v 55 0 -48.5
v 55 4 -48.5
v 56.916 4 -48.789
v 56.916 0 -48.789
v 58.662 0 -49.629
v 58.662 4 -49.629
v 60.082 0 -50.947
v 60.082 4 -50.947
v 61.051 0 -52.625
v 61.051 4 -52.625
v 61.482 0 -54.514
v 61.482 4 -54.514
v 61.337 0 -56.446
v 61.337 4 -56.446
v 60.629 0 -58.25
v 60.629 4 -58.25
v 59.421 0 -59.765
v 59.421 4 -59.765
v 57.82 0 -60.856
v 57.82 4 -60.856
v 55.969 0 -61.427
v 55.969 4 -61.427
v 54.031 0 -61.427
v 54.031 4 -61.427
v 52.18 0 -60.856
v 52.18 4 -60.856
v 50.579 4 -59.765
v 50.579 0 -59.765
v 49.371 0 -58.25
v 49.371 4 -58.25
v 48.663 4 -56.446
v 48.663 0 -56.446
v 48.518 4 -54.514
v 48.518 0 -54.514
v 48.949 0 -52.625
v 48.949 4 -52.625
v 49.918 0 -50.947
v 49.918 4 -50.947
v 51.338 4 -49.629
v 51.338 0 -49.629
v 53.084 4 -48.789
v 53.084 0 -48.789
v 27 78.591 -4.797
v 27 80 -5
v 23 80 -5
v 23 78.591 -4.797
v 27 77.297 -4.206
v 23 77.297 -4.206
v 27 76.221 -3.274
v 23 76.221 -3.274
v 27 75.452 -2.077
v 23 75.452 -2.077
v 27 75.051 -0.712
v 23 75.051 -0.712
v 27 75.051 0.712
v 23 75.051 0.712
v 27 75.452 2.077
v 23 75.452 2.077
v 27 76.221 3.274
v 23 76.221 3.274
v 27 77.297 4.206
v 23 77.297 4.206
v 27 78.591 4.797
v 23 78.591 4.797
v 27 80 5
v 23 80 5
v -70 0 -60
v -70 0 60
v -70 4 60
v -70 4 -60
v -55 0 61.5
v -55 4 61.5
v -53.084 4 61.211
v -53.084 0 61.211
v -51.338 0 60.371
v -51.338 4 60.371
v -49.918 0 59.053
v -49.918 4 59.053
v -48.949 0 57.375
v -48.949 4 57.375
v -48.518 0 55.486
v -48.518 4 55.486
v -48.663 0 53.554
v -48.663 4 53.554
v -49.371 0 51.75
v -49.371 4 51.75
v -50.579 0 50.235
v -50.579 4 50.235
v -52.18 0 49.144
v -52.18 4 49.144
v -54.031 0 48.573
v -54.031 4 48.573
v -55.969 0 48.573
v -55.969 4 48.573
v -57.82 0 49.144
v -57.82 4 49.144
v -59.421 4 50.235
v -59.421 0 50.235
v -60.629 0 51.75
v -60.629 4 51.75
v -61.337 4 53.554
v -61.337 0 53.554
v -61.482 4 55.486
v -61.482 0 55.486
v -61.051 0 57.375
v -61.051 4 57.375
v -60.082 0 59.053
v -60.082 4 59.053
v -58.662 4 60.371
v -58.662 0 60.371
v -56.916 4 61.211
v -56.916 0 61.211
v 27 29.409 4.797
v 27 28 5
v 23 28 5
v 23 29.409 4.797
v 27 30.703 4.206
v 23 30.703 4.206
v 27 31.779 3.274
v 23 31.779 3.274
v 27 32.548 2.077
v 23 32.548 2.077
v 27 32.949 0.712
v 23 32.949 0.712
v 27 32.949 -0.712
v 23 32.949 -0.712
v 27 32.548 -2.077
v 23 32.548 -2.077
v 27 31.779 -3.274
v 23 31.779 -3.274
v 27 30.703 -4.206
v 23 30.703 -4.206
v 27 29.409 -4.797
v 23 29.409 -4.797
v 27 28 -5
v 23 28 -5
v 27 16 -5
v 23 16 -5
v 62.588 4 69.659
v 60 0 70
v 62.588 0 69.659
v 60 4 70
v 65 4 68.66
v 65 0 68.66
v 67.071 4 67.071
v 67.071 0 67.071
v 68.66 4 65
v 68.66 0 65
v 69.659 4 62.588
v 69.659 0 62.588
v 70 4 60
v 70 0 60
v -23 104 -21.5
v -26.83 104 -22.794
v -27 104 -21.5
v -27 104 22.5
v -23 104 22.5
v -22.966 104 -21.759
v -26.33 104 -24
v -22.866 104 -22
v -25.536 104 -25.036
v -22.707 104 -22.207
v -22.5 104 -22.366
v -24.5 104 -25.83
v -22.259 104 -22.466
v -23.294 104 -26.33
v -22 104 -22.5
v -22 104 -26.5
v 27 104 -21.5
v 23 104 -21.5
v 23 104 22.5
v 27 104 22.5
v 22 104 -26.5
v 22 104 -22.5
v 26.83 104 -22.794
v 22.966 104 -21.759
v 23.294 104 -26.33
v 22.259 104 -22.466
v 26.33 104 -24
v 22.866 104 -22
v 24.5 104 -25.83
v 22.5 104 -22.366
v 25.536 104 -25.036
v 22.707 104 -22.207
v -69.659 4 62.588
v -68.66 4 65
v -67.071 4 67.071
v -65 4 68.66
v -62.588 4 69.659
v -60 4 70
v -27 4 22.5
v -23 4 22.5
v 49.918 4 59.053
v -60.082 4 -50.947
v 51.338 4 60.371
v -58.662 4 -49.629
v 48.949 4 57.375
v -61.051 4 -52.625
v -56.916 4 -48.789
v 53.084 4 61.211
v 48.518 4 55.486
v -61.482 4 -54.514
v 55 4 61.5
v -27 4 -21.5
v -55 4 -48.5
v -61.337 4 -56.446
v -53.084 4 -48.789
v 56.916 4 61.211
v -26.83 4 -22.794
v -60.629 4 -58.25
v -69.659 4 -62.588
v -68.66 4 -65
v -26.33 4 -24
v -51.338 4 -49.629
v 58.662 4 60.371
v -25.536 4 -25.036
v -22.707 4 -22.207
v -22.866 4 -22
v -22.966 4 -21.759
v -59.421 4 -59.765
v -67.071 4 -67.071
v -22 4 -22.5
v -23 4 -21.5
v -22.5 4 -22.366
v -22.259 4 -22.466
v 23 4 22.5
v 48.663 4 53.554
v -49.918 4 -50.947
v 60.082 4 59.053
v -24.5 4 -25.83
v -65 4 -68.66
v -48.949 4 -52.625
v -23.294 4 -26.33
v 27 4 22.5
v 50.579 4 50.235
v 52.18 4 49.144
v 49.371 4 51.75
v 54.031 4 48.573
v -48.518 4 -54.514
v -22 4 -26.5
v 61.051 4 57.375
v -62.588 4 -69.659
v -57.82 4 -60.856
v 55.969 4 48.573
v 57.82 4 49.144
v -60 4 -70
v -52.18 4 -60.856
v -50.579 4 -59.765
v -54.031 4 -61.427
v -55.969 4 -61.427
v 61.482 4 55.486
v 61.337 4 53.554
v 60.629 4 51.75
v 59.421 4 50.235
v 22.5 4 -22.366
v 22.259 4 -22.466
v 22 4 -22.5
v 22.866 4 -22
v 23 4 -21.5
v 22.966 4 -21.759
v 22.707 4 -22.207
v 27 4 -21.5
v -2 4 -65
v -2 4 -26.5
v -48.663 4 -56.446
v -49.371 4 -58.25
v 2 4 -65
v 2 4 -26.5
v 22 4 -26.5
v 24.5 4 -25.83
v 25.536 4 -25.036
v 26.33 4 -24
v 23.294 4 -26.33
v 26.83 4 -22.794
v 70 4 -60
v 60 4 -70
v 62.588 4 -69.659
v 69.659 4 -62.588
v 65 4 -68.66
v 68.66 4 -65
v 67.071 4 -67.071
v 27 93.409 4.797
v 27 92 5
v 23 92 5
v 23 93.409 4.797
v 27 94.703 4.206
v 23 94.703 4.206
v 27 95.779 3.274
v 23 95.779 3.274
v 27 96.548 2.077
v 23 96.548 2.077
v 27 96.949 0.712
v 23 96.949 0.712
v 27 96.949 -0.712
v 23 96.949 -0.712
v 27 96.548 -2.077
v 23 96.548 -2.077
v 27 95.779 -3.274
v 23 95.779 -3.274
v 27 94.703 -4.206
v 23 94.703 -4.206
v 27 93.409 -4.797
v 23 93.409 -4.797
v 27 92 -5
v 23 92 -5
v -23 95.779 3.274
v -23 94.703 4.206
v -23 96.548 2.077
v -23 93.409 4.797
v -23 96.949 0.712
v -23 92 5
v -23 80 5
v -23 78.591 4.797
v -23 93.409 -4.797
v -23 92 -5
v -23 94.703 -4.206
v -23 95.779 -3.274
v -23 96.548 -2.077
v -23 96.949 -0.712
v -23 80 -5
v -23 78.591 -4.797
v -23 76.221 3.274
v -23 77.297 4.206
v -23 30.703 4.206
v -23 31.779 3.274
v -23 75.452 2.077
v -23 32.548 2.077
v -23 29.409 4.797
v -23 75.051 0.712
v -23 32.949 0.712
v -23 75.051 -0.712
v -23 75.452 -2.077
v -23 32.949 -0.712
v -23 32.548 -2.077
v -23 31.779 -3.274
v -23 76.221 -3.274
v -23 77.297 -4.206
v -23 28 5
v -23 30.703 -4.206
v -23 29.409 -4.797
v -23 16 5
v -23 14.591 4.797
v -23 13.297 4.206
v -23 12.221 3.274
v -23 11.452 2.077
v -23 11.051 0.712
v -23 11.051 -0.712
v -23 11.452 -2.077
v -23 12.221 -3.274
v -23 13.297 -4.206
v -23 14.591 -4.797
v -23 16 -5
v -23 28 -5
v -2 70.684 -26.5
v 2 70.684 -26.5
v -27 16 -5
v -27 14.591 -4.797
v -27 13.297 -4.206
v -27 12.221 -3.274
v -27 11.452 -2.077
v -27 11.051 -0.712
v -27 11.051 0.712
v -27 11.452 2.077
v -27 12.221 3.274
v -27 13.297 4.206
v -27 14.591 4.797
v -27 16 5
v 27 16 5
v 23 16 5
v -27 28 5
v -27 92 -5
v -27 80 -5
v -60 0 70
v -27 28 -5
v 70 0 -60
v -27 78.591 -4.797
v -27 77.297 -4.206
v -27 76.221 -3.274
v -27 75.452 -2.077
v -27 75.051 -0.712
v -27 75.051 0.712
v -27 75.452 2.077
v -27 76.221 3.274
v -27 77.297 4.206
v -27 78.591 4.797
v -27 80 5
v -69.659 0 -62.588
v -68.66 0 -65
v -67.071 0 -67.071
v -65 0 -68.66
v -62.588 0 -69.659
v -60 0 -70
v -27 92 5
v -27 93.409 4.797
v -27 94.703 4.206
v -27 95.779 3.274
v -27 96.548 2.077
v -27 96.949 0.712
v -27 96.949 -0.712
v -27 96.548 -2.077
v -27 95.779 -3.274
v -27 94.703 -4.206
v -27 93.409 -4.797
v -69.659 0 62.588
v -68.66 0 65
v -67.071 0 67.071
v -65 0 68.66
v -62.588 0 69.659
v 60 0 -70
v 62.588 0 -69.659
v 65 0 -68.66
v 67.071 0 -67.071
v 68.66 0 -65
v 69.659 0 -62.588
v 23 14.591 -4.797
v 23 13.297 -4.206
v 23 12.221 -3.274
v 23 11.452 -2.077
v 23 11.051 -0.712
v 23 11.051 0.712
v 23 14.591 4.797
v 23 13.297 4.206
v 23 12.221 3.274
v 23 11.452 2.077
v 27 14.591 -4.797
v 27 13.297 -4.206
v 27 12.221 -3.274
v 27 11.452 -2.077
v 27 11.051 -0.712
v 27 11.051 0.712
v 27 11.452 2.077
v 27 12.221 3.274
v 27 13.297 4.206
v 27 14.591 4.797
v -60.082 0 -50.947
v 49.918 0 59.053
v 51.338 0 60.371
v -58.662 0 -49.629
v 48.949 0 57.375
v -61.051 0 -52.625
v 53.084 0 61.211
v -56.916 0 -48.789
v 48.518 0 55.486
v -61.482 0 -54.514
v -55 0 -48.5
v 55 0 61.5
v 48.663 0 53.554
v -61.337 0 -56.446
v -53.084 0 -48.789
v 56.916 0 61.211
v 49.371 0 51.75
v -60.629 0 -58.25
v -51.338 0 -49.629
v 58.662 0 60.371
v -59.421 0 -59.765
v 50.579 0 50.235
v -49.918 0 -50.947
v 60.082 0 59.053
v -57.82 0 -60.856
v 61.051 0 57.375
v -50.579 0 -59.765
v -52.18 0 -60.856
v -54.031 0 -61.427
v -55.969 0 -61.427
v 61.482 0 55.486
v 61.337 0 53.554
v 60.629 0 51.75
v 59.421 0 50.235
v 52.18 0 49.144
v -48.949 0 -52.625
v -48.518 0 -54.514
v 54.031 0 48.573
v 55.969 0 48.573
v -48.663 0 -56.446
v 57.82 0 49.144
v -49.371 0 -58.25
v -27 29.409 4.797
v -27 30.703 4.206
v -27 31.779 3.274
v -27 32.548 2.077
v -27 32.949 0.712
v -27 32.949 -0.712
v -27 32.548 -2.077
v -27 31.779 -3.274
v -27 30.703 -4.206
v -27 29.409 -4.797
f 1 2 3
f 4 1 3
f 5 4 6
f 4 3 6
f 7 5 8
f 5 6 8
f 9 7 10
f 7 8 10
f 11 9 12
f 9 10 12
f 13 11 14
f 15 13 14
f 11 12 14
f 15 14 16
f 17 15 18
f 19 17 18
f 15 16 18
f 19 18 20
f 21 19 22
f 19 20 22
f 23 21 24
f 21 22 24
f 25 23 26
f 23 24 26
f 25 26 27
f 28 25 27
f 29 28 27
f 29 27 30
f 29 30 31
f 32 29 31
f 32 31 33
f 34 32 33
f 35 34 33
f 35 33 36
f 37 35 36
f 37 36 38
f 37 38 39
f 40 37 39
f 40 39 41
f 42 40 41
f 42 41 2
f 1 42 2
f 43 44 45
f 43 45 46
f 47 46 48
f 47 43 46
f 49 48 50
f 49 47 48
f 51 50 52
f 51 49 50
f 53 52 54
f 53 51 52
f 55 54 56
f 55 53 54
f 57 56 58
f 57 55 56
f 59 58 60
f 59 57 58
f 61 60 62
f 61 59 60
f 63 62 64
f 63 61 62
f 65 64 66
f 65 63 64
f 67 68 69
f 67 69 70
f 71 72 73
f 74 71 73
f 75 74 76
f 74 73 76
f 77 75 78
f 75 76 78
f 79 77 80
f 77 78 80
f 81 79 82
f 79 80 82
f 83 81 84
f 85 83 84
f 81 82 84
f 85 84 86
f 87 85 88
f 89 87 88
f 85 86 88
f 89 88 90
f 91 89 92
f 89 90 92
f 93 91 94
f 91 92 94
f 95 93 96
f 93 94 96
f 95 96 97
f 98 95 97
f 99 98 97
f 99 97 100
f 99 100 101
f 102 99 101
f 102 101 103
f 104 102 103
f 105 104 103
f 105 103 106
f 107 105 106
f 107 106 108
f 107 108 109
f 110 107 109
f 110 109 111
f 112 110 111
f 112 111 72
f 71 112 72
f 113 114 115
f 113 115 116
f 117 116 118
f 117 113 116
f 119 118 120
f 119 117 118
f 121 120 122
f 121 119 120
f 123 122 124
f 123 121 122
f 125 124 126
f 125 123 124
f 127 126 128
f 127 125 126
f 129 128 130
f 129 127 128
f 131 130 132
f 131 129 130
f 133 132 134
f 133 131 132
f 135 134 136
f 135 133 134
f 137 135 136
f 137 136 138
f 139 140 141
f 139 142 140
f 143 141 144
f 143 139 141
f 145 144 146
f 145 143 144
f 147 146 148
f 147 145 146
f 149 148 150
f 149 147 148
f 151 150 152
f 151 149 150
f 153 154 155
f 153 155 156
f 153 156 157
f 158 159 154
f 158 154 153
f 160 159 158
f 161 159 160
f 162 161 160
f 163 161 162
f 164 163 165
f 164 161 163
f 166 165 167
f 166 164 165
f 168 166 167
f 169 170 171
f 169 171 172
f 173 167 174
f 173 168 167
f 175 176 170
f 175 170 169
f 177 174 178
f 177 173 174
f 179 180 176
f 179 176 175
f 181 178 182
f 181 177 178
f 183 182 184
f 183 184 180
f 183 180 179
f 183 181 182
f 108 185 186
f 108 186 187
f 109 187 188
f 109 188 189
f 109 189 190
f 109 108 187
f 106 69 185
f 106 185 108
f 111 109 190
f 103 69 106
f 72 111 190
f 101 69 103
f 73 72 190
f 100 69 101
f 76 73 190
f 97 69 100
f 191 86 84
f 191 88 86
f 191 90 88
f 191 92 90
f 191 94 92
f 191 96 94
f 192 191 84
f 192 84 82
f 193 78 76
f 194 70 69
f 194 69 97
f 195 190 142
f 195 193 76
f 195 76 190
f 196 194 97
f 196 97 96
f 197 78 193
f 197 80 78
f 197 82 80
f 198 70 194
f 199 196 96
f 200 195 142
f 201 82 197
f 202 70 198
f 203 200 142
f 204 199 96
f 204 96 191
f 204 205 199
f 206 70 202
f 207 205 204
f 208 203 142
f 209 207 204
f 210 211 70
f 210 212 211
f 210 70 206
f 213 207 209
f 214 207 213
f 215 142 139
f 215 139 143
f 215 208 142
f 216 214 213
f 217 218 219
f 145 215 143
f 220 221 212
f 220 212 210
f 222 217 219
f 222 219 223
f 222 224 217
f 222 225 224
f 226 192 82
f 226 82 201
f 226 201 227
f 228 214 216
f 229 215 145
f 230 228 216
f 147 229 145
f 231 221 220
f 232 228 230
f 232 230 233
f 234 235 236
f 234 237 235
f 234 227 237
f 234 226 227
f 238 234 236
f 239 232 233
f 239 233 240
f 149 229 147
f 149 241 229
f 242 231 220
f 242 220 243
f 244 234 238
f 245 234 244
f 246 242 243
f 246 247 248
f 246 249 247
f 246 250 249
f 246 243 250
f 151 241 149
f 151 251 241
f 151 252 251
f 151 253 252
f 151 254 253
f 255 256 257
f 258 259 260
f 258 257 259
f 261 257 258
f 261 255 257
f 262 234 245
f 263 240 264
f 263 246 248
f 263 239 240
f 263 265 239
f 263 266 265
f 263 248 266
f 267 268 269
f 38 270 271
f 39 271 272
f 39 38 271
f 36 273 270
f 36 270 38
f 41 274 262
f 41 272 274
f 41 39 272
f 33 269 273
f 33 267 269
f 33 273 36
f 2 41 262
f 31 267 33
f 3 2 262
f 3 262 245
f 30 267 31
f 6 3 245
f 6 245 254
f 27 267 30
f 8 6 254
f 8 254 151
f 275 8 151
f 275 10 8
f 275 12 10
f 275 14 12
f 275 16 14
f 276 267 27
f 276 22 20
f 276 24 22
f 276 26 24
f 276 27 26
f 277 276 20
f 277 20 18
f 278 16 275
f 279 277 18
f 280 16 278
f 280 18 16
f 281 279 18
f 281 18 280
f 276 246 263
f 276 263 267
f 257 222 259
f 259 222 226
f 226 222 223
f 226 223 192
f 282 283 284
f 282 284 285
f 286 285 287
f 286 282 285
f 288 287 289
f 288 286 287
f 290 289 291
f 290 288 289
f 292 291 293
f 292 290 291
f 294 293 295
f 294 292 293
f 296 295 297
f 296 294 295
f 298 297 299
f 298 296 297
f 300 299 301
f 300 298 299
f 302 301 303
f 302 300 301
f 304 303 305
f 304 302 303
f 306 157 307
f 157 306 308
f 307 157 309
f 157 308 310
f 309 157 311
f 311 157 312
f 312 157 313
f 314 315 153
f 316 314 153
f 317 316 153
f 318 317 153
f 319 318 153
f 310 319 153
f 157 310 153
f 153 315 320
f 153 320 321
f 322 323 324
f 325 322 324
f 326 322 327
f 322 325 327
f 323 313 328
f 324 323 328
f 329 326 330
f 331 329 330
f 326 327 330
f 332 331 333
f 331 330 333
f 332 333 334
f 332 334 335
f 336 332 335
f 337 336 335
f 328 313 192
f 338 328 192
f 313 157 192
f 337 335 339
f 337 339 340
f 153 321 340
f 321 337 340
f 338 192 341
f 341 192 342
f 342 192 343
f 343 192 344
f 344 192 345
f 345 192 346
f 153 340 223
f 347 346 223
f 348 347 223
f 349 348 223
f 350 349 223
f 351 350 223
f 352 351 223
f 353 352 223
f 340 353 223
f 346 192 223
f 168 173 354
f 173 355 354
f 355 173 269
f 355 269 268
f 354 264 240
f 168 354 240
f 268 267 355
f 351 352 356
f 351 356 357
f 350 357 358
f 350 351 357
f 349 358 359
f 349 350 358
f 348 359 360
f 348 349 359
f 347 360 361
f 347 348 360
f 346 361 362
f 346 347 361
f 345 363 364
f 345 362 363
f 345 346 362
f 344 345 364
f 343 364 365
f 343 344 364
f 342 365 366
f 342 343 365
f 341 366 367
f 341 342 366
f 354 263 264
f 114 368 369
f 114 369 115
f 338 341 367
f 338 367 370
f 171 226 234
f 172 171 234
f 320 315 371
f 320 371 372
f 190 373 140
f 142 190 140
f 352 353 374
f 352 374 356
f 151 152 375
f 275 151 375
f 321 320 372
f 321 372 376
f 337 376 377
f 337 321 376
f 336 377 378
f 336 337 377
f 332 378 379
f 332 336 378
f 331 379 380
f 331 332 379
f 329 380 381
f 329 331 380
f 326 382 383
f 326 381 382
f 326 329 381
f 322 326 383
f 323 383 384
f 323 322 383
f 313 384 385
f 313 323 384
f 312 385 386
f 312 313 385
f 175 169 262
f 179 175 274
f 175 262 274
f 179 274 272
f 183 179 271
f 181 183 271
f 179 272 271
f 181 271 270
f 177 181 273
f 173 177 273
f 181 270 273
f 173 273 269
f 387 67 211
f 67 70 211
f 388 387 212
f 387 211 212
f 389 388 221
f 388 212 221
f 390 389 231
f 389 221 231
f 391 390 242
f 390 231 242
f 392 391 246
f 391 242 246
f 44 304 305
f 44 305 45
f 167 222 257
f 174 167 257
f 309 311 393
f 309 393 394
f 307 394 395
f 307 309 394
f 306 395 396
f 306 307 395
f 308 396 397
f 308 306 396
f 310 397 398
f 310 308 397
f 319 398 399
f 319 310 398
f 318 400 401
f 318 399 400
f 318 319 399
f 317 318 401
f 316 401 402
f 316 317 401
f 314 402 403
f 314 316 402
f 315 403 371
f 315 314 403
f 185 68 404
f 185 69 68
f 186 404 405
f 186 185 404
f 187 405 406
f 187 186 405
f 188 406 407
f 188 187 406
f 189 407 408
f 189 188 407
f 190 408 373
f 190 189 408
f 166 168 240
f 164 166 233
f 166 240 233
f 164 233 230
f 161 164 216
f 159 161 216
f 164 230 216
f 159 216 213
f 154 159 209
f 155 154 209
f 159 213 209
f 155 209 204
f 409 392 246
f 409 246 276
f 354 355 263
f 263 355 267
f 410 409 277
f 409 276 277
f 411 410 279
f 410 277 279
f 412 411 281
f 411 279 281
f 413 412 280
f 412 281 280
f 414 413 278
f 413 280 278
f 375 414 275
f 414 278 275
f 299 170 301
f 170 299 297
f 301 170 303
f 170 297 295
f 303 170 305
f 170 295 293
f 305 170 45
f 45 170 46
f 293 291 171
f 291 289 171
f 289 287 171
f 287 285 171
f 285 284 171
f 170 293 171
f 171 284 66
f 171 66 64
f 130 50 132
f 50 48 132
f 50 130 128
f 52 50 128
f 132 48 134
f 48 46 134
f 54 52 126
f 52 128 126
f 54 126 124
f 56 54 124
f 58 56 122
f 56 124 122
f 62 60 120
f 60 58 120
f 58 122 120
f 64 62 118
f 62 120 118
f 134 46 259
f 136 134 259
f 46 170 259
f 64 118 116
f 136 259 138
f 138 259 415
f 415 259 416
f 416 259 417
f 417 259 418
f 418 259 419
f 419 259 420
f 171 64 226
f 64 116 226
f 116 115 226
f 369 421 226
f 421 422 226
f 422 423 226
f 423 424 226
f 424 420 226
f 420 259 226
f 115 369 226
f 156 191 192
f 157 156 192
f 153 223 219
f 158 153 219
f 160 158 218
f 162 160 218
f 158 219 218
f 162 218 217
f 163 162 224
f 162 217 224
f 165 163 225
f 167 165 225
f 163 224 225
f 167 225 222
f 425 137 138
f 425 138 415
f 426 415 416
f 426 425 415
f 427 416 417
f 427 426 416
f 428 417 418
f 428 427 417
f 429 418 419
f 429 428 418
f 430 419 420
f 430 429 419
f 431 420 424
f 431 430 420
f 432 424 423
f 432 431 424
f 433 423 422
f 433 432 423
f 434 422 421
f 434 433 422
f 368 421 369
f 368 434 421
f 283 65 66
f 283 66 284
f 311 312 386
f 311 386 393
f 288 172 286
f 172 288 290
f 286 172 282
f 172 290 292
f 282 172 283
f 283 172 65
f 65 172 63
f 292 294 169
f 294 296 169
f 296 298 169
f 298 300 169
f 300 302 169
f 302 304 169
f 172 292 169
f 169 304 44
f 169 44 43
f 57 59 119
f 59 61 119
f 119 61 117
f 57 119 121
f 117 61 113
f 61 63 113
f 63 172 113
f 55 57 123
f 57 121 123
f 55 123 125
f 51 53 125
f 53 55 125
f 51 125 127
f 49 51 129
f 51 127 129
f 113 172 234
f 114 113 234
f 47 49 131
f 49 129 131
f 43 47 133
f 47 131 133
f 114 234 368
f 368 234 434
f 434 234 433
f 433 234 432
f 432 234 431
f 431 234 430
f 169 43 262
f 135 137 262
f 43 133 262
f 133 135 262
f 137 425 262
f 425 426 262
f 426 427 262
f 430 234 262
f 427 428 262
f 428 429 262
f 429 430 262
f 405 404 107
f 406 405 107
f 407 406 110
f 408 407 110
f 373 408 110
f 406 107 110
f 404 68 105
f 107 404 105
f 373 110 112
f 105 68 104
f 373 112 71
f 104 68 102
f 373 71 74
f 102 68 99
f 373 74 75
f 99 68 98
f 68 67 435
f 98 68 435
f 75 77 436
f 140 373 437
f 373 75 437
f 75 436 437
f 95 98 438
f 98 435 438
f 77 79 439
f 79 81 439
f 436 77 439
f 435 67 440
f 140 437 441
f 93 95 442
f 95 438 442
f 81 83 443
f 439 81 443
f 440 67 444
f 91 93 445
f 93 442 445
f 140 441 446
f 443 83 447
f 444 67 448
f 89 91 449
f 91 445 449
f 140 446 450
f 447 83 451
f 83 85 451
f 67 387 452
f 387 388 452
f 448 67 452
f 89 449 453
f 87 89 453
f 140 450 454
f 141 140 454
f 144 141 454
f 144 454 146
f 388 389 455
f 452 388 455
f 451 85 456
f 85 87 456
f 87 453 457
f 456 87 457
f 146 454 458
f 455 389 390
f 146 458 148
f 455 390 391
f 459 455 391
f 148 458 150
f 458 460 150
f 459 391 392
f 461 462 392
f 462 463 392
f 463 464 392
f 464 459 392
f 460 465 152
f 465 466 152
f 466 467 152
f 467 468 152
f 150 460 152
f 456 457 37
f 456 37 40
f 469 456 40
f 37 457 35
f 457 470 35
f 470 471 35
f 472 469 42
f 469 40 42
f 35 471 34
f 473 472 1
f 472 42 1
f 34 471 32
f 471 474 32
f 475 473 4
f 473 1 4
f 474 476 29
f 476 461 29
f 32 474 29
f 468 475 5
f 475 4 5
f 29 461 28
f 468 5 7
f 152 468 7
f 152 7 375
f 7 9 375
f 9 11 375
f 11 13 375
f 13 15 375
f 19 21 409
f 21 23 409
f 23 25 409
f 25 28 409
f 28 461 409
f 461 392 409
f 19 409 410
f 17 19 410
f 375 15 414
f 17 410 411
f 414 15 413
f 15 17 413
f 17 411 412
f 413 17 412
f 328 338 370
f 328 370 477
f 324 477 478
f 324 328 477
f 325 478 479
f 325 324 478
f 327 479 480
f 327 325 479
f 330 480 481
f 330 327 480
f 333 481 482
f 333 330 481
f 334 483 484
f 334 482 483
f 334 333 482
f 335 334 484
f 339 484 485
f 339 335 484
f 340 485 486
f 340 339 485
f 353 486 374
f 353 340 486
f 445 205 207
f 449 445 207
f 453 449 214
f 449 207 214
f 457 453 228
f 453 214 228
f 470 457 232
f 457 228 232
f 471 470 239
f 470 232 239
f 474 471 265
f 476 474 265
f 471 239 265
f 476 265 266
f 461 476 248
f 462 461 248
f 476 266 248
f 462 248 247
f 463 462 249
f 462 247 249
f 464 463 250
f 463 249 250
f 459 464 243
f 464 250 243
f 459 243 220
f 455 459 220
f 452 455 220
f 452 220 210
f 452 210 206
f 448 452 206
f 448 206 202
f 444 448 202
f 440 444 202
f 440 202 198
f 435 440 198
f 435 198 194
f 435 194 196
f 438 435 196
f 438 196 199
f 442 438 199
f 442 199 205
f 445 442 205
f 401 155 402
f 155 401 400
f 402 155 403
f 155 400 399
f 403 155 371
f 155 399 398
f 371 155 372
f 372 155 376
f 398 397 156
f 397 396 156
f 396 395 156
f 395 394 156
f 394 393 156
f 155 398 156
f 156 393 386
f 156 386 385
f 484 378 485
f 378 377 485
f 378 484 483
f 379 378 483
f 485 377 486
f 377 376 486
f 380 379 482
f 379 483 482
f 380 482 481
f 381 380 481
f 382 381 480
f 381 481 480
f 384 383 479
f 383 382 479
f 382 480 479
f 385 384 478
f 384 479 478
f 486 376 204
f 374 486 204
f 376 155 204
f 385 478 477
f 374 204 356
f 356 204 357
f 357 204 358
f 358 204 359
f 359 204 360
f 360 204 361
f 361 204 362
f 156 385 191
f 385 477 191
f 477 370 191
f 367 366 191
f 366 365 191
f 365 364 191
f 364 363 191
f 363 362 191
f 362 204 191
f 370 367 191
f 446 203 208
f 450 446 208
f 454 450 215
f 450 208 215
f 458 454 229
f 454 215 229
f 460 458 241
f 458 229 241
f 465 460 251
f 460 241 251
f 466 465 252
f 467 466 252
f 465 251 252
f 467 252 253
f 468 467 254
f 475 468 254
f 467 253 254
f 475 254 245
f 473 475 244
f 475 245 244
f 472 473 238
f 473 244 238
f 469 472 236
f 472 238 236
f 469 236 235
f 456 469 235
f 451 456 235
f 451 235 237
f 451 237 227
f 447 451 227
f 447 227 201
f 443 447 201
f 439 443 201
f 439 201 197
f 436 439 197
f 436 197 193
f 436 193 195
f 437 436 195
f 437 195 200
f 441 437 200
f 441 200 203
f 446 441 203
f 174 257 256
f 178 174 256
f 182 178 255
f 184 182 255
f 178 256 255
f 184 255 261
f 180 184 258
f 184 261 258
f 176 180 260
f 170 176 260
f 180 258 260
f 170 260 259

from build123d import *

# Parameters (mm, degrees)
SKETCH_2_W          = 140
SKETCH_2_H          = 140
EXTRUDE_1_DEPTH     = 4
EXTRUDE_1_2_DEPTH   = 100
EXTRUDE_2_DEPTH     = 2
CUT_EXTRUDE_1_DEPTH = 98
SKETCH_6_R          = 6.5
CUT_EXTRUDE_2_DEPTH = 5
FILLET_1_R          = 10


with BuildPart() as part:
    # Эскиз2 → Extrude 1 (new body)
    with BuildSketch(Plane(origin=(0, 0, 0), x_dir=(1, 0, 0), z_dir=(0, 1, 0))):
        Rectangle(SKETCH_2_W, SKETCH_2_H)
    extrude(amount=EXTRUDE_1_DEPTH)

    # Эскиз3 → Extrude 1 2 (add)
    with BuildSketch(Plane(origin=(0, 4, 0), x_dir=(1, 0, 0), z_dir=(0, 1, 0))):
        with BuildLine():
            Line((-23, -22.5), (-23, 21.5))
            ThreePointArc((-23, 21.5), (-22.707106781, 22.207106781), (-22, 22.5))
            Line((-22, 22.5), (22, 22.5))
            ThreePointArc((22, 22.5), (22.707106781, 22.207106781), (23, 21.5))
            Line((23, 21.5), (23, -22.5))
            Line((23, -22.5), (27, -22.5))
            Line((27, -22.5), (27, 21.5))
            ThreePointArc((27, 21.5), (25.535533906, 25.035533906), (22, 26.5))
            Line((22, 26.5), (-22, 26.5))
            ThreePointArc((-22, 26.5), (-25.535533906, 25.035533906), (-27, 21.5))
            Line((-27, 21.5), (-27, -22.5))
            Line((-27, -22.5), (-23, -22.5))
        make_face()
    extrude(amount=EXTRUDE_1_2_DEPTH)

    # Эскиз4 → Бобышка-Вытянуть2 (add, symmetric)
    with BuildSketch(Plane(origin=(0, 0, 0), x_dir=(0, 0, -1), z_dir=(1, 0, 0))):
        Polygon((26.5, 70.683956091), (65, 4), (26.5, 4), align=None)
    extrude(amount=EXTRUDE_2_DEPTH, both=True)

    # Эскиз5 → Вырез-Вытянуть1 (cut, through all)
    with BuildSketch(Plane(origin=(27, 0, 0), x_dir=(0, 0, -1), z_dir=(1, 0, 0))):
        with BuildLine():
            Line((5, 92), (5, 80))
            ThreePointArc((5, 80), (0, 75), (-5, 80))
            Line((-5, 80), (-5, 92))
            ThreePointArc((-5, 92), (0, 97), (5, 92))
        make_face()
        with BuildLine():
            Line((5, 28), (5, 16))
            ThreePointArc((5, 16), (0, 11), (-5, 16))
            Line((-5, 16), (-5, 28))
            ThreePointArc((-5, 28), (0, 33), (5, 28))
        make_face()
    extrude(amount=-CUT_EXTRUDE_1_DEPTH, mode=Mode.SUBTRACT)

    # Эскиз6 → Вырез-Вытянуть2 (cut, through all)
    with BuildSketch(Plane(origin=(0, 4, 0), x_dir=(1, 0, 0), z_dir=(0, 1, 0))):
        with Locations(Location((-55, 55, 0), (0, 0, 270))):  # turned: the seam where the file's is
            Circle(SKETCH_6_R)
        with Locations(Location((-55, -55, 0), (0, 0, 270))):  # turned: the seam where the file's is
            Circle(SKETCH_6_R)
        with Locations(Location((55, 55, 0), (0, 0, 270))):  # turned: the seam where the file's is
            Circle(SKETCH_6_R)
        with Locations(Location((55, -55, 0), (0, 0, 270))):  # turned: the seam where the file's is
            Circle(SKETCH_6_R)
    extrude(amount=-CUT_EXTRUDE_2_DEPTH, mode=Mode.SUBTRACT)

    # Скругление1
    fillet_1_edges = [part.edges().sort_by_distance(p)[0] for p in [
        (70, 2, 70),
        (-70, 2, 70),
        (-70, 2, -70),
        (70, 2, -70),
    ]]
    fillet(fillet_1_edges, radius=FILLET_1_R)


solid = part.part
